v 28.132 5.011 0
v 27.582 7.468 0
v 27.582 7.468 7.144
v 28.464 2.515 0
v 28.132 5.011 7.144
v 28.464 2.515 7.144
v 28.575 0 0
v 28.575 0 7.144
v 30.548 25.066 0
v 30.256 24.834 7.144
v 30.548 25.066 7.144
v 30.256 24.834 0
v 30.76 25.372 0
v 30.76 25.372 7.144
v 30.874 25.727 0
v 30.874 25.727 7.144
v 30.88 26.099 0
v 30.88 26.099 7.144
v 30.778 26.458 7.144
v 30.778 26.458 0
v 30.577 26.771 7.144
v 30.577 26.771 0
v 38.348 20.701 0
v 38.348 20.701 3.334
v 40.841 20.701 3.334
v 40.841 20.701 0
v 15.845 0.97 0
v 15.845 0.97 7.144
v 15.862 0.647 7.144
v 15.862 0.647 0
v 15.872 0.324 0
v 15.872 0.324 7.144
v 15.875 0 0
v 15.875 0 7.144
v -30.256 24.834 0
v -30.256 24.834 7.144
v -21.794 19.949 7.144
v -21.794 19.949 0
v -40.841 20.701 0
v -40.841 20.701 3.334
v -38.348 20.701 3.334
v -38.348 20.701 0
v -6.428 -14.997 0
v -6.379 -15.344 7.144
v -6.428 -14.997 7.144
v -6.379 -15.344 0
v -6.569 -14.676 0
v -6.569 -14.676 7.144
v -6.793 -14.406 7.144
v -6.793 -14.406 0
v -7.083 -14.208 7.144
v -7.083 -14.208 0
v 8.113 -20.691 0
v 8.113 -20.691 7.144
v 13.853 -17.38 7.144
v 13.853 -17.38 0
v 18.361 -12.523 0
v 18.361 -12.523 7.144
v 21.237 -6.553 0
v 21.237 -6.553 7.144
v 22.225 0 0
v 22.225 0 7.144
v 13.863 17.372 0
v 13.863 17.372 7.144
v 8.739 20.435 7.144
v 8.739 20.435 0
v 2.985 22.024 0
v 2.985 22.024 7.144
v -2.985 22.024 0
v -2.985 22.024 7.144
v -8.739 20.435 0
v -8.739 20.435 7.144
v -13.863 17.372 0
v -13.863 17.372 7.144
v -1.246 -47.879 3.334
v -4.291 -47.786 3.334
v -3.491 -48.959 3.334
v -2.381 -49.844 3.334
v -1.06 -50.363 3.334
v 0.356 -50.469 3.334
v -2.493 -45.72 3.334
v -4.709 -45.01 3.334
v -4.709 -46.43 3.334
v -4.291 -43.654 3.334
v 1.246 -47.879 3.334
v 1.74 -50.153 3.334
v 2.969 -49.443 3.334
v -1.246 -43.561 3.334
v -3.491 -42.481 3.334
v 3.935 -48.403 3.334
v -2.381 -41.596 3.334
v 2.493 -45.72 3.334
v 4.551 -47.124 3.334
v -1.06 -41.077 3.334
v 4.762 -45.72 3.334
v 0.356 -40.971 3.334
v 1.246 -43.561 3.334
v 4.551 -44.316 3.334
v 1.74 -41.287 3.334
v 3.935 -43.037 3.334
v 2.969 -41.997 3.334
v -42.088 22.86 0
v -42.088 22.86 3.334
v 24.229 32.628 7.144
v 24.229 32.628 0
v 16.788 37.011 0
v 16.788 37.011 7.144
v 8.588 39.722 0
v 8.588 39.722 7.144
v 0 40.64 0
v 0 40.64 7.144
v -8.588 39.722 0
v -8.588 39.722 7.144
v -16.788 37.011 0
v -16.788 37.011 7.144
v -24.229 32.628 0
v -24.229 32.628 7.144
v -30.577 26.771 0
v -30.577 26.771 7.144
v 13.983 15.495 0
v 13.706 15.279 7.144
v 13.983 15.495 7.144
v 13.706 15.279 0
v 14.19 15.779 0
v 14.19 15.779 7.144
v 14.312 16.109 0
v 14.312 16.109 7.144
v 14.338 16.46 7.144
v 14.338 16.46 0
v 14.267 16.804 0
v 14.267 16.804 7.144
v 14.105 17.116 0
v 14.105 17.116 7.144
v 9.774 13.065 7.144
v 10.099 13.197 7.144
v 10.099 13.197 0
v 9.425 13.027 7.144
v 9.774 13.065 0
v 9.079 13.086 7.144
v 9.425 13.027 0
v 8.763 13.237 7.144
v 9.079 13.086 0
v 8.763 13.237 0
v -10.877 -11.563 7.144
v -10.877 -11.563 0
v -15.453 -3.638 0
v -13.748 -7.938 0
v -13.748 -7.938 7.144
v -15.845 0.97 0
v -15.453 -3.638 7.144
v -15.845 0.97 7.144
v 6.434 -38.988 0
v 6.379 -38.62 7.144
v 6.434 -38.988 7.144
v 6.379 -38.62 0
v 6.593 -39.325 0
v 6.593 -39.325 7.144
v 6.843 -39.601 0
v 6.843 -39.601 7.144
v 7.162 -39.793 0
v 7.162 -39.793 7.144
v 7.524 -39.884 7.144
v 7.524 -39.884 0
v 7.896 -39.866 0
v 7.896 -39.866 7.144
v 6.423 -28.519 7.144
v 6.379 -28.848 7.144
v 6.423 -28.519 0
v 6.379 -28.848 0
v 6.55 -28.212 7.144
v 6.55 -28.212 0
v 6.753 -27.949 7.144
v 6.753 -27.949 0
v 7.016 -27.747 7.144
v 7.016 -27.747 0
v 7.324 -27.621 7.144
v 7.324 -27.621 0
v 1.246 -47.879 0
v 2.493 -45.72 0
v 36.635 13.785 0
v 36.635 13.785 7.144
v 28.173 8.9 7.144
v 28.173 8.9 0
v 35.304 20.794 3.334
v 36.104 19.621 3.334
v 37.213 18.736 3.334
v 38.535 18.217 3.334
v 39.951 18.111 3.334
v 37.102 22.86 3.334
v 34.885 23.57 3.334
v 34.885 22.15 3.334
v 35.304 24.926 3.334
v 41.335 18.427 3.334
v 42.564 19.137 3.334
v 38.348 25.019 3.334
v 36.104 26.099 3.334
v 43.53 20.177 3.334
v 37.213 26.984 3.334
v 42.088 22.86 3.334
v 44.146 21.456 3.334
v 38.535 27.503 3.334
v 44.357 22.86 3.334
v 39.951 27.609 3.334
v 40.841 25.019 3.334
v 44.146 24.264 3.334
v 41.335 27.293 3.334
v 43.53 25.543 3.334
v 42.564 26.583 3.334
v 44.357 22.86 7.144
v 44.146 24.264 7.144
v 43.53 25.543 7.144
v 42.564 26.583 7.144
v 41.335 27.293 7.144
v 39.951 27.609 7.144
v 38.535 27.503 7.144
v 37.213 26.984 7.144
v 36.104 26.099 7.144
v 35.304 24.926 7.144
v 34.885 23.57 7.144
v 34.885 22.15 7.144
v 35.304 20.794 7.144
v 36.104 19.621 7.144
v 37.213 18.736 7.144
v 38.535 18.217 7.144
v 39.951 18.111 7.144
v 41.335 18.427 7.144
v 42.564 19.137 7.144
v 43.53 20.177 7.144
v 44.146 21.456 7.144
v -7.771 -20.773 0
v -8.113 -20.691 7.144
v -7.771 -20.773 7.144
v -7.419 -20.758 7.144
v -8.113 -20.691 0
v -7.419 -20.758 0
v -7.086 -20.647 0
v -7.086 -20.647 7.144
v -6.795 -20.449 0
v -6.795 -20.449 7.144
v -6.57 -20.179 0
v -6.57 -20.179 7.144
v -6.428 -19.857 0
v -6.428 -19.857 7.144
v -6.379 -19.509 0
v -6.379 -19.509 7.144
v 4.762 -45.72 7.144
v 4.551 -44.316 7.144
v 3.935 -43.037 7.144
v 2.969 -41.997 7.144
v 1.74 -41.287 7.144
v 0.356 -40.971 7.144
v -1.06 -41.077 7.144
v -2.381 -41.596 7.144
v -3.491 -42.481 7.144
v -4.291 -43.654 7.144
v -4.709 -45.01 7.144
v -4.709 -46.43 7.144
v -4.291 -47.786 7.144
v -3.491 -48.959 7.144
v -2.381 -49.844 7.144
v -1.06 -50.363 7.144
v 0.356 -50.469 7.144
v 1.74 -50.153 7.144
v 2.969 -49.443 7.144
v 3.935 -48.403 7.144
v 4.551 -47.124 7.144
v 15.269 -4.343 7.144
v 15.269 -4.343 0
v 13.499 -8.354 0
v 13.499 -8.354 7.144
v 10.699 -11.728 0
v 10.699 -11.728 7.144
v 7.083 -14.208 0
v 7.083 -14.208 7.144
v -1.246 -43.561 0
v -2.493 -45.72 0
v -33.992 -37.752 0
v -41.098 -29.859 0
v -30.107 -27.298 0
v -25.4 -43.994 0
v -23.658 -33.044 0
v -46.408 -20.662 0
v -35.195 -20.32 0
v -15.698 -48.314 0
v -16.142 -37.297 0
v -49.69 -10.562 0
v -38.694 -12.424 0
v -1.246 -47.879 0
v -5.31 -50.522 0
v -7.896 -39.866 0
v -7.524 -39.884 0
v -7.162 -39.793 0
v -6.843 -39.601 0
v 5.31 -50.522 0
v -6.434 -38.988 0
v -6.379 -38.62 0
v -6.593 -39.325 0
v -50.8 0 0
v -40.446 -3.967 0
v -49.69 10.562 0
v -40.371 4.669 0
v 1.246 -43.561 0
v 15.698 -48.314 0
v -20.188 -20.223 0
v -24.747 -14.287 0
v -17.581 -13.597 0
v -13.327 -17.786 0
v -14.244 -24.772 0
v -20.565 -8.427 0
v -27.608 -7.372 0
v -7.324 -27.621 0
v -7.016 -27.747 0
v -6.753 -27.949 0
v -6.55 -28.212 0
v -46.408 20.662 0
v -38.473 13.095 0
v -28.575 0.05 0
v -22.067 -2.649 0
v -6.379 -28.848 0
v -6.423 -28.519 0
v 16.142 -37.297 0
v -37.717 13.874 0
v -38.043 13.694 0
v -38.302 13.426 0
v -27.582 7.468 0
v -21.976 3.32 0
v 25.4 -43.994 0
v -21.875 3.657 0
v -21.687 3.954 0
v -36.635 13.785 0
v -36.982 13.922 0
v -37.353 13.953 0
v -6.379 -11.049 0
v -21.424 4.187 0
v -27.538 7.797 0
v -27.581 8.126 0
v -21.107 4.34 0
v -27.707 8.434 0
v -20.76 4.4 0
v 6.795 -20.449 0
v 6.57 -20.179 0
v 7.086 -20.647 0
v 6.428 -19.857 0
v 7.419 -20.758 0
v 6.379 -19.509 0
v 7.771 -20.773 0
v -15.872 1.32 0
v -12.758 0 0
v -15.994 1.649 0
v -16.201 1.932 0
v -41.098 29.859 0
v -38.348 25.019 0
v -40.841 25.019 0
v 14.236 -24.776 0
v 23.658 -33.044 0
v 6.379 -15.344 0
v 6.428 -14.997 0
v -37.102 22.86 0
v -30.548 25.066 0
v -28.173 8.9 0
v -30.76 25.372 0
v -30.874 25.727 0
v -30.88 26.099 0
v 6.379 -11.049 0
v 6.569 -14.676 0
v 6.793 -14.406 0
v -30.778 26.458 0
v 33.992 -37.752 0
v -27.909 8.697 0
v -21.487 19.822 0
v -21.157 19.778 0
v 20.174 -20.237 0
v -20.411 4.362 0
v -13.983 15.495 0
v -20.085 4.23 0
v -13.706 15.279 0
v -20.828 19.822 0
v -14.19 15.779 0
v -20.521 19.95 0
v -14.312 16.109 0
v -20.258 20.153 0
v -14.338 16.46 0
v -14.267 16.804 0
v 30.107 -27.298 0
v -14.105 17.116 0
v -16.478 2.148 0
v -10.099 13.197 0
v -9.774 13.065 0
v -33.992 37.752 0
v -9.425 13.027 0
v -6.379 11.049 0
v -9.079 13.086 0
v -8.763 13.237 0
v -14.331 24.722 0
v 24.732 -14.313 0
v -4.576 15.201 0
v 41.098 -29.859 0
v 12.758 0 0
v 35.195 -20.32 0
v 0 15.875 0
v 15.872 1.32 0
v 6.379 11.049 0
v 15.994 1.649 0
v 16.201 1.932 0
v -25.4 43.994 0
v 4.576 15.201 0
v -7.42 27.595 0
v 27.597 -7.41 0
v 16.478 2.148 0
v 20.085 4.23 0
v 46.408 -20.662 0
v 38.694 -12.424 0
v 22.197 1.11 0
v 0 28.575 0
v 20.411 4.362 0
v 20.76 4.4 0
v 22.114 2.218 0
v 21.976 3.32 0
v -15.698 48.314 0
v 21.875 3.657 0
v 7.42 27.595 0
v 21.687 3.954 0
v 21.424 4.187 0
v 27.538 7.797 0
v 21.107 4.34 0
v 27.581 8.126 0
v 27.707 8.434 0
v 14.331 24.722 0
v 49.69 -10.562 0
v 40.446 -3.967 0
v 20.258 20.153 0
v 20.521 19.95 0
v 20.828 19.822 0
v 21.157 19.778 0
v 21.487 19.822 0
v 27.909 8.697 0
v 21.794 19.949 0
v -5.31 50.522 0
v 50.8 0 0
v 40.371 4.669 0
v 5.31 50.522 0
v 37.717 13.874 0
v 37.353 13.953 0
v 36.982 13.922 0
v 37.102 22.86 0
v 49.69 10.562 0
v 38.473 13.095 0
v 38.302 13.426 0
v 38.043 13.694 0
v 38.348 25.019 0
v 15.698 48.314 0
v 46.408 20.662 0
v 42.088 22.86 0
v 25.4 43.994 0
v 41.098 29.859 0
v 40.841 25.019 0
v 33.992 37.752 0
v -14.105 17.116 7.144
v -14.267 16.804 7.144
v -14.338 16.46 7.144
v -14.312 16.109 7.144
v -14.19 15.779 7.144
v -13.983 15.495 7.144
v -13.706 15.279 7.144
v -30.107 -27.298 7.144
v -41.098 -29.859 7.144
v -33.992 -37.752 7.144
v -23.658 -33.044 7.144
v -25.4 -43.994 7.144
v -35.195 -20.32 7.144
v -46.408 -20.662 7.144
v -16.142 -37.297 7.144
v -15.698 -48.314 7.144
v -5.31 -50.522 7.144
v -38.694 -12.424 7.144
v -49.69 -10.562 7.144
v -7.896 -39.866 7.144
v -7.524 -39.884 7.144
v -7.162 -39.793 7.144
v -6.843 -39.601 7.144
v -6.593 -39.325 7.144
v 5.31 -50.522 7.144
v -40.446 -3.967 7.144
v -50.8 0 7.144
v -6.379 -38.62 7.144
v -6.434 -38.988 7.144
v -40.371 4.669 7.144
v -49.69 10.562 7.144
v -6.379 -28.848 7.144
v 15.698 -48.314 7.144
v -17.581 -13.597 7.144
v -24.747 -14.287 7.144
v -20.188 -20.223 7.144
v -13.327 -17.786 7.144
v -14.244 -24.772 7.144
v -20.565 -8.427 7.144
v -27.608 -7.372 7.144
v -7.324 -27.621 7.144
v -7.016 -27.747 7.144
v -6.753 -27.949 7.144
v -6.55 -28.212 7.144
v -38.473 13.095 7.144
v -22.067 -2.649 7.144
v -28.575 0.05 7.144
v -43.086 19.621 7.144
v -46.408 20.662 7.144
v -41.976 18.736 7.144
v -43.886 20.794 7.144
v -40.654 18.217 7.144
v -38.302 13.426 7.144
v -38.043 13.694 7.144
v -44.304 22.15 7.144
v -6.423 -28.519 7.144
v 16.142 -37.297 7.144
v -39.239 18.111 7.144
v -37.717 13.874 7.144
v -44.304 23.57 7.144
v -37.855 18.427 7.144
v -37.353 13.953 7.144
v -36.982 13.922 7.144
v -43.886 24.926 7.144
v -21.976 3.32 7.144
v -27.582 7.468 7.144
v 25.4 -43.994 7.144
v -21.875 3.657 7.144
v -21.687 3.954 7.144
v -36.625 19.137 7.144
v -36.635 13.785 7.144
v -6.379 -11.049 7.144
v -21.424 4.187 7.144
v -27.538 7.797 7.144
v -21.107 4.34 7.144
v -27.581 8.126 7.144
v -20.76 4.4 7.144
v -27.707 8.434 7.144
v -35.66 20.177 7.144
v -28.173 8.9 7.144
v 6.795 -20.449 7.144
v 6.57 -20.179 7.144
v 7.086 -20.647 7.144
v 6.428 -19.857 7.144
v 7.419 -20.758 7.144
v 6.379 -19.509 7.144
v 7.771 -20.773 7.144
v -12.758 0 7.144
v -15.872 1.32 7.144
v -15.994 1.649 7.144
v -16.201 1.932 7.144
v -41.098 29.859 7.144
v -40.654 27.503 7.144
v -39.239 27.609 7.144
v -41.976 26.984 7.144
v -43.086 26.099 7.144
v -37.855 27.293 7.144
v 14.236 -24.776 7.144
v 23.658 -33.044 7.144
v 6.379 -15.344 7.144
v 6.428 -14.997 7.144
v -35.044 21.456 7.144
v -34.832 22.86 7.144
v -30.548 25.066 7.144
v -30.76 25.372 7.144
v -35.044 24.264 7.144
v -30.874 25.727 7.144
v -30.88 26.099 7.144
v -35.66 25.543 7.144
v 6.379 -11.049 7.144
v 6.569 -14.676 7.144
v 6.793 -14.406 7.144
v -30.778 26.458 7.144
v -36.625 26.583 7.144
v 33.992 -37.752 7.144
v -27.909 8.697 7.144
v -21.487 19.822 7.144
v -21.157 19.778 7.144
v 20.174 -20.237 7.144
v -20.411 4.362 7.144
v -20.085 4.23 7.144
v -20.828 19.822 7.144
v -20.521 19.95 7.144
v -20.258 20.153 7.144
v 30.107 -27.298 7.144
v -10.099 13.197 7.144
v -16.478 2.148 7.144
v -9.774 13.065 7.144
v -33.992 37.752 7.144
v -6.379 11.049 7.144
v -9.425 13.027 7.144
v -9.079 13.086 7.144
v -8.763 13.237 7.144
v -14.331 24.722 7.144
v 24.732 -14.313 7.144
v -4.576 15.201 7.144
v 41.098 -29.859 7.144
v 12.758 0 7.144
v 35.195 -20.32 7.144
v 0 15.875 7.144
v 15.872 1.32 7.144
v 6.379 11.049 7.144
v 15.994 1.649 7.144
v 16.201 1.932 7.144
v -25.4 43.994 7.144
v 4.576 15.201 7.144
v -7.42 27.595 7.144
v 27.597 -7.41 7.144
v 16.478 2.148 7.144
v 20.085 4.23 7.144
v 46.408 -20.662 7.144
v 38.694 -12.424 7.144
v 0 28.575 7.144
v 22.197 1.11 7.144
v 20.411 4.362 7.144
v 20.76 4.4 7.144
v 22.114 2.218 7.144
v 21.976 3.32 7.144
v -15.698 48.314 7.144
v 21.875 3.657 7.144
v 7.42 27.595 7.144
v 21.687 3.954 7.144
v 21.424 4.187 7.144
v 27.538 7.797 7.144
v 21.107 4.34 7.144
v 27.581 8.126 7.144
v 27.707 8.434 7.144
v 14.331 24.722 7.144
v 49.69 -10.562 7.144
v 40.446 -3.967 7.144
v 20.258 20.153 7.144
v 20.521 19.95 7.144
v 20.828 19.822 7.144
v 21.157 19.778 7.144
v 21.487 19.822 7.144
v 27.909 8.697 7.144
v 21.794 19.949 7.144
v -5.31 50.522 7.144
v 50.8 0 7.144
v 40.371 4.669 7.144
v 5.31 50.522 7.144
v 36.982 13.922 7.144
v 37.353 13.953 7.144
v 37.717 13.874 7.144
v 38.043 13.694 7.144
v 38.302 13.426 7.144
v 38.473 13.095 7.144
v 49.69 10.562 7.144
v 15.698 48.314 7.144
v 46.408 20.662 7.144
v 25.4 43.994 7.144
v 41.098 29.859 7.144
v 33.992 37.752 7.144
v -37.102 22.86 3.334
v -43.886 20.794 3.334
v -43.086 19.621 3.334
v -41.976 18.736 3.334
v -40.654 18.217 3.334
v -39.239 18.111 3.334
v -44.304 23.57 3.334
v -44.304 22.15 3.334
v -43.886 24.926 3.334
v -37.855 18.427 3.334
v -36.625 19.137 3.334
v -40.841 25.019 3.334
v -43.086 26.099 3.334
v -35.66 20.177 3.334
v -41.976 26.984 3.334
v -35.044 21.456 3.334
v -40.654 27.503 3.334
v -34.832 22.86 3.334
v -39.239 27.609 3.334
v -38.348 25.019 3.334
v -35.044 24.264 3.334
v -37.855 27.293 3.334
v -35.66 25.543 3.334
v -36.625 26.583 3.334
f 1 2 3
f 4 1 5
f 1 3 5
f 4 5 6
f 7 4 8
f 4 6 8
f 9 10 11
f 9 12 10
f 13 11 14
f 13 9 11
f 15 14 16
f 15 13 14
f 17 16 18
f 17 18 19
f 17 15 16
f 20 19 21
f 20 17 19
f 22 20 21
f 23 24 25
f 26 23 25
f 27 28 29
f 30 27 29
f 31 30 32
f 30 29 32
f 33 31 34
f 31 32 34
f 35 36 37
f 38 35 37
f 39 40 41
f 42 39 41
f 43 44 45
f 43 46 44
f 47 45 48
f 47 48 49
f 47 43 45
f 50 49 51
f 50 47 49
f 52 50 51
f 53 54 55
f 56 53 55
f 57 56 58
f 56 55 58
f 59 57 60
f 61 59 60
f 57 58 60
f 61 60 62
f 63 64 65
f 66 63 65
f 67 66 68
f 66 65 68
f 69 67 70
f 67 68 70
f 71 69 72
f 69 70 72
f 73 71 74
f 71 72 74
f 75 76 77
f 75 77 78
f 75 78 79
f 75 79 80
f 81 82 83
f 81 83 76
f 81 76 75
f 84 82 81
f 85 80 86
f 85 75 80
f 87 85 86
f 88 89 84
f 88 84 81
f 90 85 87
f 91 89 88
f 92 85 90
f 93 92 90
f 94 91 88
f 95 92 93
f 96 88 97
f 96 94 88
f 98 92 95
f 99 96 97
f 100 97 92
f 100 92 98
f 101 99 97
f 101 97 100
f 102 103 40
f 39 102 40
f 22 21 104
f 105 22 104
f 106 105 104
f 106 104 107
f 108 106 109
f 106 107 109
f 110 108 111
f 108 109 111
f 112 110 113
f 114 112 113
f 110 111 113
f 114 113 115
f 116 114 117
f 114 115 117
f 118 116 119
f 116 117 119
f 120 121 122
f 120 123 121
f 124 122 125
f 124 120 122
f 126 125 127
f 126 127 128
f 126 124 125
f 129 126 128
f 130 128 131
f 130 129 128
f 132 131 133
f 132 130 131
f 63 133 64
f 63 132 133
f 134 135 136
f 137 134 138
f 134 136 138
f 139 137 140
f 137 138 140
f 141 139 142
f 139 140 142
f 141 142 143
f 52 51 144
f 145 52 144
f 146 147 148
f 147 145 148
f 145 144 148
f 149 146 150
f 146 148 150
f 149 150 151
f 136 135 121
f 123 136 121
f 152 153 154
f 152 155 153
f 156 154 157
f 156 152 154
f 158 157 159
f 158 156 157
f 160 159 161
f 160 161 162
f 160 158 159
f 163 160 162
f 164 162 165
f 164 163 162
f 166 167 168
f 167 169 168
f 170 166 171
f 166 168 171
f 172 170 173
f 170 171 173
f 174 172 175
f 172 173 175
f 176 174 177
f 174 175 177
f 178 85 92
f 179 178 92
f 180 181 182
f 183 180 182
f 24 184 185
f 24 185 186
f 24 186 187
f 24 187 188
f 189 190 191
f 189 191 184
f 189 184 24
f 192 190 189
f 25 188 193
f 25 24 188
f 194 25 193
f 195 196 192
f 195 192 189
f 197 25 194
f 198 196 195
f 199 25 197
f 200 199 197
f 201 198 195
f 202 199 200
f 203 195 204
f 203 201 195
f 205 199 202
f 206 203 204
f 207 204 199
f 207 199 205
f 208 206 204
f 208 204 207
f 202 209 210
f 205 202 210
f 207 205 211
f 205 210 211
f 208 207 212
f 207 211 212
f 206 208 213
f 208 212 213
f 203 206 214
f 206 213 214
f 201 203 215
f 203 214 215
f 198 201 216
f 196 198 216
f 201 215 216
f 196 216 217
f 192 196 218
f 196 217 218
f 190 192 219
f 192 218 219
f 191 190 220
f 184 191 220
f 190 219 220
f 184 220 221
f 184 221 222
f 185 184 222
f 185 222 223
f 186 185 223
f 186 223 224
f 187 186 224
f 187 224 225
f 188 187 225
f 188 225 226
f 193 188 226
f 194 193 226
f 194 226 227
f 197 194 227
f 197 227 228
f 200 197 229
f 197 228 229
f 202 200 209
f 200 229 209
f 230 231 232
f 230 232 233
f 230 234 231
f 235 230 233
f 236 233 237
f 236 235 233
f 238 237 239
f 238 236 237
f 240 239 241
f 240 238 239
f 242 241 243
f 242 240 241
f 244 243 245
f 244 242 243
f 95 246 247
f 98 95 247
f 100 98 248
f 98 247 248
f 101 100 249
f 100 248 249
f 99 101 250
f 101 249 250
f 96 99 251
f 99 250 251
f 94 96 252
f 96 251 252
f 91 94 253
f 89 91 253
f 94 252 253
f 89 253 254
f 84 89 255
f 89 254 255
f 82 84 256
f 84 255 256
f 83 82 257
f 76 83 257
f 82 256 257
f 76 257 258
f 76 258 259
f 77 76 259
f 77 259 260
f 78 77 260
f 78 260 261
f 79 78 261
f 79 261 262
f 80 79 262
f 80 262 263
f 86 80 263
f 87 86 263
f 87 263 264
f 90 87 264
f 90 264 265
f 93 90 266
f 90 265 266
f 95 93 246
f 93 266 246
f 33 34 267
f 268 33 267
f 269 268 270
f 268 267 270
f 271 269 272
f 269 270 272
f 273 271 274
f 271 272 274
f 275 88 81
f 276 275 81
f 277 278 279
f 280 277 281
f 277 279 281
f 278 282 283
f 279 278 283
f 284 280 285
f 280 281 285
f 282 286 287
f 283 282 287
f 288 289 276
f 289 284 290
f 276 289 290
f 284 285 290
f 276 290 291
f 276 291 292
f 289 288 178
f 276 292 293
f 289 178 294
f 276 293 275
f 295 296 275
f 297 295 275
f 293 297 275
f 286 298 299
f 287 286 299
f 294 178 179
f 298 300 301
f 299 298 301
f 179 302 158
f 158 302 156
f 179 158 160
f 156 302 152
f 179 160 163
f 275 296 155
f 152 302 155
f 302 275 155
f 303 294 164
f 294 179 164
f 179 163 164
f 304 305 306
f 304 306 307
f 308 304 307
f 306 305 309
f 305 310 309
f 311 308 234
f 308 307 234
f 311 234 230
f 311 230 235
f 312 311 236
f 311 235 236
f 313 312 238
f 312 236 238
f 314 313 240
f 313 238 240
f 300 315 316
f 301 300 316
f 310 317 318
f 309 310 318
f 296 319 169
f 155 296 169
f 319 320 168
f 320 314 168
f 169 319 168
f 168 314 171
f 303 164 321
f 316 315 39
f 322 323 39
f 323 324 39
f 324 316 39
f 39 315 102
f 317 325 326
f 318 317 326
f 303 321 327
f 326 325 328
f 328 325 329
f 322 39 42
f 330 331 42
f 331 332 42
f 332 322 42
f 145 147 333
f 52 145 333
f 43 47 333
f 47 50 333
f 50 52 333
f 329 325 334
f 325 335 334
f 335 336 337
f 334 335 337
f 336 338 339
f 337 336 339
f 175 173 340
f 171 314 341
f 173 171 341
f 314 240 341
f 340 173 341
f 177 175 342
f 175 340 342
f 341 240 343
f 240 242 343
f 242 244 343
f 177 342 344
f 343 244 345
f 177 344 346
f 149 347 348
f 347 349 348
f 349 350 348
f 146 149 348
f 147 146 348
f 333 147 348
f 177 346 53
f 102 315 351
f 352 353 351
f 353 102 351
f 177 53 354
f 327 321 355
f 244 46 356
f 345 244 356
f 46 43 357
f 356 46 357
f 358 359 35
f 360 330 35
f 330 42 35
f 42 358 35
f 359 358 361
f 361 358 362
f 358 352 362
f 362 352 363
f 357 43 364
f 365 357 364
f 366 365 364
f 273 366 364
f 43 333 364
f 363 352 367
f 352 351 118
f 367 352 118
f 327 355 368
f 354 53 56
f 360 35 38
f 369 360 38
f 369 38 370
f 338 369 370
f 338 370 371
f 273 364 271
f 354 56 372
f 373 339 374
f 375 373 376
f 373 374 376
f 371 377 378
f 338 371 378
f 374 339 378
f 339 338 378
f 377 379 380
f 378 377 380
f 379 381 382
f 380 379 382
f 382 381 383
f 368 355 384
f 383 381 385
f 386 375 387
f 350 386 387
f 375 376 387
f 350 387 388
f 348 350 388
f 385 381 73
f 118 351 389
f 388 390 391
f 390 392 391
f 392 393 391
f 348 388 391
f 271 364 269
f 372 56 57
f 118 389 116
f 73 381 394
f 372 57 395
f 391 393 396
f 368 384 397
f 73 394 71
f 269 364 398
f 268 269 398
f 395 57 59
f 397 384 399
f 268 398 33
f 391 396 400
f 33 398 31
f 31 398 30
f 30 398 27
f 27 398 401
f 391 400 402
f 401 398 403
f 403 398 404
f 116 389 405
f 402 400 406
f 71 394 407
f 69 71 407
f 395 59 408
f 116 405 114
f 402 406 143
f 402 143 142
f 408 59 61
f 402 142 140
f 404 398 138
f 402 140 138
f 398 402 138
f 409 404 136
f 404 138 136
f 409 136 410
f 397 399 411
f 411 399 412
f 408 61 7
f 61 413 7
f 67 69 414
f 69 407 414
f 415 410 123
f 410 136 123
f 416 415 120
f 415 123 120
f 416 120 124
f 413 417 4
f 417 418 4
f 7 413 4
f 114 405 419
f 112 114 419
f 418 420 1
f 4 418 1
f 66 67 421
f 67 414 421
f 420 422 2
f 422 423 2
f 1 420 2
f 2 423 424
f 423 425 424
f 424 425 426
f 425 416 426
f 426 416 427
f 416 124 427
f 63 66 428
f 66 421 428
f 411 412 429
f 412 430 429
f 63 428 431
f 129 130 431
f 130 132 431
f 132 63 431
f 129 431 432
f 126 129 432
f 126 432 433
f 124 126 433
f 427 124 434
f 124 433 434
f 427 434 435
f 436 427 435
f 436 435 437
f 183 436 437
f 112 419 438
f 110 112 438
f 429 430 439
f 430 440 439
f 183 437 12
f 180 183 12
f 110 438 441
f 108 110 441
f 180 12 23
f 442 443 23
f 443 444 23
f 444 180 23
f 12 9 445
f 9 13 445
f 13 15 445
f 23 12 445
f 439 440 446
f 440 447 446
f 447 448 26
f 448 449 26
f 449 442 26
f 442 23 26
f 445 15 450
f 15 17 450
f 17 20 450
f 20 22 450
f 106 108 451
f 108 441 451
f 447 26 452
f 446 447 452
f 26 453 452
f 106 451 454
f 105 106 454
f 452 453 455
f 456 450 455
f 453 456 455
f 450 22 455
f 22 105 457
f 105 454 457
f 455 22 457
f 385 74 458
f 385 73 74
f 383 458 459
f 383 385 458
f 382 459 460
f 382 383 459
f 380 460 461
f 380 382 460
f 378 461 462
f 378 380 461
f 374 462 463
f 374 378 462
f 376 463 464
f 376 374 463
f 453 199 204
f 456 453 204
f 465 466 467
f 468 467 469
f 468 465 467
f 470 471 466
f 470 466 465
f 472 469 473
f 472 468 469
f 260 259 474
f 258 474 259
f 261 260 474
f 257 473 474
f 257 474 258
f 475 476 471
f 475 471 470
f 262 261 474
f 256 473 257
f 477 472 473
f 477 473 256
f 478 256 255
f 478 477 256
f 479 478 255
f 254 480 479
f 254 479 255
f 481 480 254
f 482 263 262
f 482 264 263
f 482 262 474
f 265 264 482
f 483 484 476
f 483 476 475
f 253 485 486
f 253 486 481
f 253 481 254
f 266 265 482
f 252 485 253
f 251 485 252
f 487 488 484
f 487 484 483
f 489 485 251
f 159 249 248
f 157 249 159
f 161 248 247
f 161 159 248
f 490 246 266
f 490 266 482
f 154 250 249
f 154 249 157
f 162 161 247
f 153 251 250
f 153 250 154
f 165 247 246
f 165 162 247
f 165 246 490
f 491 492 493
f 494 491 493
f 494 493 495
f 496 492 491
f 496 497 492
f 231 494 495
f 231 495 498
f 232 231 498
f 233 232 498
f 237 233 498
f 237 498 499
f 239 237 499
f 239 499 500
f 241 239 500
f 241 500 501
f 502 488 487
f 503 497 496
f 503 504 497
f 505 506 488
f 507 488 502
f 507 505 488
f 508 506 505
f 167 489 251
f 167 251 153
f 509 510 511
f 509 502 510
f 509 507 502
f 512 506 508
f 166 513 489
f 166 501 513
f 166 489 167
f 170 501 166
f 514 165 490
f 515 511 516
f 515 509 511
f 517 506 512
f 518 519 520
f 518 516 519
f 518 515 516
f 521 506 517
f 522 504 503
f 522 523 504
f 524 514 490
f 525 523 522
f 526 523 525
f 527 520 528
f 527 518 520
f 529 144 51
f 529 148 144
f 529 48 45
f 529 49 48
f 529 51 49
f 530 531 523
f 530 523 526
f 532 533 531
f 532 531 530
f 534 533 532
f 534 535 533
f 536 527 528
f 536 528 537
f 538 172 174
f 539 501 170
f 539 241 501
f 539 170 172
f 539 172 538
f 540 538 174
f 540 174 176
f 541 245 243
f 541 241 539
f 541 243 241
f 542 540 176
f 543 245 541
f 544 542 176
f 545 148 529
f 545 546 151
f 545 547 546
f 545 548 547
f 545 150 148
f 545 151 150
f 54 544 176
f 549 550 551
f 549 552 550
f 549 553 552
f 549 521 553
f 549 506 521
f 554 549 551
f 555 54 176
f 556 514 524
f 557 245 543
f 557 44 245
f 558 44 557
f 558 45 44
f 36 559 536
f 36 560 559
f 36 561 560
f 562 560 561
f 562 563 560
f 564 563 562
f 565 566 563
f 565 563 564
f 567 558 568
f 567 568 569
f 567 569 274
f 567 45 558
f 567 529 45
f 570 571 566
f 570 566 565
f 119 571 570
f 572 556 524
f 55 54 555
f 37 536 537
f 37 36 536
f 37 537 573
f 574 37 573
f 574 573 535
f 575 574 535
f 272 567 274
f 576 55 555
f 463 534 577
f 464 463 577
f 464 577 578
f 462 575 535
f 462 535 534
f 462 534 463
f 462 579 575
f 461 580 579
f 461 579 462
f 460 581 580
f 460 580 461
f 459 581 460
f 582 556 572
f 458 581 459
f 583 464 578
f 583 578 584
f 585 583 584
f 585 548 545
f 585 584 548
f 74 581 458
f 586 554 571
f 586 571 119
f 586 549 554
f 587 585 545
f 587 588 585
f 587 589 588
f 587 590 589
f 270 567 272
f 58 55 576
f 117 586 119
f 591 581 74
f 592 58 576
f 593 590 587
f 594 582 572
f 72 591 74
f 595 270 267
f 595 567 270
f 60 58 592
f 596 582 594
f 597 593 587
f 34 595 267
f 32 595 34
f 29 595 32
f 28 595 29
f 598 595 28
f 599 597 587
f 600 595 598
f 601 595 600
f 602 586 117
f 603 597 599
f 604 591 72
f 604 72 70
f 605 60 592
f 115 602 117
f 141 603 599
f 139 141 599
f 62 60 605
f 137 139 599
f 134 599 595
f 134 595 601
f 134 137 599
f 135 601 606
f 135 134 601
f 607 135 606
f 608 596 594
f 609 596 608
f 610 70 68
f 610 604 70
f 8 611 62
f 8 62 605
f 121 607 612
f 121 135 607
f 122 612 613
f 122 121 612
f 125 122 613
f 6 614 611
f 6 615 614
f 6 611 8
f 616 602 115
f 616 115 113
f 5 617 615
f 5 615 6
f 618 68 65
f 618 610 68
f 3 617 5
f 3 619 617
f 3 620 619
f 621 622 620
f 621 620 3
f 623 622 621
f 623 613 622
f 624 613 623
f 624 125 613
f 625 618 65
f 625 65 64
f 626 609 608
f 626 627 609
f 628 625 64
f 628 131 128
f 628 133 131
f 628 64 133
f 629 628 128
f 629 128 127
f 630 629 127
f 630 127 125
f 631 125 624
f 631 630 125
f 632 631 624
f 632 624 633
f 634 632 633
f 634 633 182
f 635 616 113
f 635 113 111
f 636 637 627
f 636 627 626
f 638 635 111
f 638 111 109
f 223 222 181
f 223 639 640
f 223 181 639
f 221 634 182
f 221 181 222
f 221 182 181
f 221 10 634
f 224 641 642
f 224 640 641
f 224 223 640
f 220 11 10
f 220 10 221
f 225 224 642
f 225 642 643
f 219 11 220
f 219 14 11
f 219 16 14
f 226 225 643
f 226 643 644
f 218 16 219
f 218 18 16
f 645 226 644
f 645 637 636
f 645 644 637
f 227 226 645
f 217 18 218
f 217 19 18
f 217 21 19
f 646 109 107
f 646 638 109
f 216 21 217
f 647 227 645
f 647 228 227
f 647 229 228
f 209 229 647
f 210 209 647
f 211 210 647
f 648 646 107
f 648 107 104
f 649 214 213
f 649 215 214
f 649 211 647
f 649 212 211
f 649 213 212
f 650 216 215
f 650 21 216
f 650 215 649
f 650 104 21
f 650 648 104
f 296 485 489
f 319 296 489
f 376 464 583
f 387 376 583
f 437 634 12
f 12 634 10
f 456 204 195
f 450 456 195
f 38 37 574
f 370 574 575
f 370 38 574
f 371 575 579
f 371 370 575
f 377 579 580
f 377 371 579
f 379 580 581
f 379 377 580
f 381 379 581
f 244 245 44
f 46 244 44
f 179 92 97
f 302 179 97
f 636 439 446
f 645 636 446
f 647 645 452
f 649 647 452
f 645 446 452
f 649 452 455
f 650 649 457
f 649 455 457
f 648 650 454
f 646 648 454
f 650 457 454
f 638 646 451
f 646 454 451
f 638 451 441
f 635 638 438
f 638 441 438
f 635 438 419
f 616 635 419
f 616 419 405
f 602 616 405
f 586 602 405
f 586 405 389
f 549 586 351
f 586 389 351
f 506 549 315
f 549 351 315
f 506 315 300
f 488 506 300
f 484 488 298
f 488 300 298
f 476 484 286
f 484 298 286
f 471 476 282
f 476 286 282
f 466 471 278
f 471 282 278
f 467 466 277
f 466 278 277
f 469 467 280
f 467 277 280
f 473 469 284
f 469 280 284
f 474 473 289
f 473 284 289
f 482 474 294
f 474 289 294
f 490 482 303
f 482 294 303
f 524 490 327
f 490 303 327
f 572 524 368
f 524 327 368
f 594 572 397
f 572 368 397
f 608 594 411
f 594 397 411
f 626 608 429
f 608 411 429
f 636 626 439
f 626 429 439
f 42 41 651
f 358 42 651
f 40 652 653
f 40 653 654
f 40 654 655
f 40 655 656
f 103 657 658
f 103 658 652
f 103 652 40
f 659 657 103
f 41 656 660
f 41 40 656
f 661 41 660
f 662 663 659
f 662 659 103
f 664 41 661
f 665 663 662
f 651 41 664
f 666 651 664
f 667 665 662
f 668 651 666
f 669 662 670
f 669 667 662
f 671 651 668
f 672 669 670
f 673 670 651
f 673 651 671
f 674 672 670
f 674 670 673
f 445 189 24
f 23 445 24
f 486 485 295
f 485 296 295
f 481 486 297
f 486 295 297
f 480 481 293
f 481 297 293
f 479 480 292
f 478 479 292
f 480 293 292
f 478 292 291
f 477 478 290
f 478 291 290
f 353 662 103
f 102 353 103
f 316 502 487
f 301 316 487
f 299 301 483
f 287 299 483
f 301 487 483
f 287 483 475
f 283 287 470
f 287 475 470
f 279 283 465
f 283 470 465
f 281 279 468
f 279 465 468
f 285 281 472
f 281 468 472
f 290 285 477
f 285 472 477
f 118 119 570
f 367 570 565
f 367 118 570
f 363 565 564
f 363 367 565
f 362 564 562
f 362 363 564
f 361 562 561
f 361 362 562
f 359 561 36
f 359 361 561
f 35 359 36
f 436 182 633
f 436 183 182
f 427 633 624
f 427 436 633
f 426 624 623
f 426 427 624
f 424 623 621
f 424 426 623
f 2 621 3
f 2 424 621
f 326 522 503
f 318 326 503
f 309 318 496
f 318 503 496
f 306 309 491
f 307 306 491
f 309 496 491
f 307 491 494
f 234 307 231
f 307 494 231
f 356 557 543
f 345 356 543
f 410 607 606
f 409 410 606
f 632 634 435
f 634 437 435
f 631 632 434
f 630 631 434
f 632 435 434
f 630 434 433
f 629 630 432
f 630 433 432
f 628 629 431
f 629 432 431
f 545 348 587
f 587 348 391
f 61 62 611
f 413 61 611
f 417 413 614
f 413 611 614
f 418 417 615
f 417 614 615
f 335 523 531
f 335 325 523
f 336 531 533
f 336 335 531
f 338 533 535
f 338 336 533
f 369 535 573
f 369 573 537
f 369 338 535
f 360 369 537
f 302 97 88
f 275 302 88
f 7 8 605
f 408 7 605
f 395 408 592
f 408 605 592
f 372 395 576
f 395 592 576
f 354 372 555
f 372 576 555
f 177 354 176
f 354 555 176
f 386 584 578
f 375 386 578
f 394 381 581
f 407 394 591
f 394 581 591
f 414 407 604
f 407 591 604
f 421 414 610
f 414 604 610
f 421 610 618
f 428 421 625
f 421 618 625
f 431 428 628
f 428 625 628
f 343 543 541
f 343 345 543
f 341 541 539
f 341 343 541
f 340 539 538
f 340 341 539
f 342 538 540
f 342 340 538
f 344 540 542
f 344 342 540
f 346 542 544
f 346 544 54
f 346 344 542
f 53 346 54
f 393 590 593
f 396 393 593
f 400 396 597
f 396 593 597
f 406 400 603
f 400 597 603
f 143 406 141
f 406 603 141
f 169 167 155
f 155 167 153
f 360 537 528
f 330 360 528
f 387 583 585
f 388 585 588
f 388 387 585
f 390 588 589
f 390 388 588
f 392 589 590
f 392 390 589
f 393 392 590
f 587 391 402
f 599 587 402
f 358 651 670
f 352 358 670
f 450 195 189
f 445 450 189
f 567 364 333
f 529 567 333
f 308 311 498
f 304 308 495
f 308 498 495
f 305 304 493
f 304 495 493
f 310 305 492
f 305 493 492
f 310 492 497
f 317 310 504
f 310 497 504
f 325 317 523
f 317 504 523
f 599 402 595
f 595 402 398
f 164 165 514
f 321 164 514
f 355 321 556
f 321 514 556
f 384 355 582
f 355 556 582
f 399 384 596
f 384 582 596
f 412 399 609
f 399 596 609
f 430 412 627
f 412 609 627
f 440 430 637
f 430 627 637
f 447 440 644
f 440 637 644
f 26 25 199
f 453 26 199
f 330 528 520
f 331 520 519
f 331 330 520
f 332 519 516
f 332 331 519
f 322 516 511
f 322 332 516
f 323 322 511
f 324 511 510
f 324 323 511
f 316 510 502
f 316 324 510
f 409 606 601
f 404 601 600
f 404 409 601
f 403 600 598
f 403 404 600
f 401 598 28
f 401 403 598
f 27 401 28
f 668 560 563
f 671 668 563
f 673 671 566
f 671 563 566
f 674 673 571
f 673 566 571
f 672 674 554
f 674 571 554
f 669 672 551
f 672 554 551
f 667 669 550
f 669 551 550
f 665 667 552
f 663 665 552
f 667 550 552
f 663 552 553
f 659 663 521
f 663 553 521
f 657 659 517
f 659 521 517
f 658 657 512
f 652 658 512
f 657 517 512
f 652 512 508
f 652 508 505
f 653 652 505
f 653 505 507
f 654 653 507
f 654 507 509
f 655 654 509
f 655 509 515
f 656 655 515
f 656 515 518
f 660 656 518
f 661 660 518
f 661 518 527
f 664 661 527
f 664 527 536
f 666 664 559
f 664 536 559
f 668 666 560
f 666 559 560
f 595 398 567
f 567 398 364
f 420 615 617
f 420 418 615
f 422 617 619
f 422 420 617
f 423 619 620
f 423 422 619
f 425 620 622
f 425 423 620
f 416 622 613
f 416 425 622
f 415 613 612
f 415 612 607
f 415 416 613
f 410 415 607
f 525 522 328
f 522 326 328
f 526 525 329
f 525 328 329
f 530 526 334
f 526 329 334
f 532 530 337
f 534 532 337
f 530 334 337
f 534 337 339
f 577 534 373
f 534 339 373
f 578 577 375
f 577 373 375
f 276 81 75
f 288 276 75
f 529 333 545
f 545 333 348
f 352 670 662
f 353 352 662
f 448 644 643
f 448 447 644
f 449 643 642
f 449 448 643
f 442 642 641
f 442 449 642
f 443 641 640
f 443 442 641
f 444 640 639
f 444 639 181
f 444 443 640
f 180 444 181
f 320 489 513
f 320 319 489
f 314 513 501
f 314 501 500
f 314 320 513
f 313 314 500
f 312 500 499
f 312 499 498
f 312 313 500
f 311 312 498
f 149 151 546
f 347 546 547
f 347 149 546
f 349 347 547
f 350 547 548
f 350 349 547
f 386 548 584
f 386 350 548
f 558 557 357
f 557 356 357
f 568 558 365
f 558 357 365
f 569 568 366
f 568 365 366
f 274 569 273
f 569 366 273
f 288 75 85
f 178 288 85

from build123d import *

# Parameters (mm, degrees)
F0_R     = 50.8
F1_DEPTH = 7.14375
F3_DEPTH = 7.14475
F4_R     = 1.27
F5_R     = 4.7625
F6_DEPTH = 3.81


with BuildPart() as f1:
    # F0 (on Top) → F1 (new body)
    with BuildSketch(Plane.XY):
        Circle(F0_R)
        Polygon((-12.7582862486, 0), (-6.3791431243, 11.049), (6.3791431243, 11.049), (12.7582862486, 0), (6.3791431243, -11.049), (-6.3791431243, -11.049), align=None, mode=Mode.SUBTRACT)
    extrude(amount=F1_DEPTH)

    # F2 (on face) → F3 (cut, through all)
    with BuildSketch(Plane.XY.offset(7.14375)):
        with BuildLine():
            Line((-6.3791431243, -40.1362197149), (-6.3791431243, -27.8538535575))
            ThreePointArc((-6.3791431243, -27.8538535575), (-24.7466759131, -14.2875), (-27.3117163362, 8.4024267787))
            Line((-27.3117163362, 8.4024267787), (-37.9485574471, 14.5436098574))
            ThreePointArc((-37.9485574471, 14.5436098574), (-35.1952724098, -20.32), (-6.3791431243, -40.1362197149))
        make_face()
        Polygon((-38.3481822298, 25.019), (-40.8411806922, 25.019), (-42.0876799234, 22.86), (-40.8411806922, 20.701), (-38.3481822298, 20.701), (-37.1016829987, 22.86), align=None)
        Polygon((1.2464992312, -43.561), (-1.2464992312, -43.561), (-2.4929984624, -45.72), (-1.2464992312, -47.879), (1.2464992312, -47.879), (2.4929984624, -45.72), align=None)
        Polygon((40.8411806922, 25.019), (38.3481822298, 25.019), (37.1016829987, 22.86), (38.3481822298, 20.701), (40.8411806922, 20.701), (42.0876799234, 22.86), align=None)
        with BuildLine():
            ThreePointArc((-20.9325732119, 19.4514267787), (0, 28.575), (20.9325732119, 19.4514267787))
            Line((20.9325732119, 19.4514267787), (31.5694143228, 25.5926098574))
            ThreePointArc((31.5694143228, 25.5926098574), (0, 40.64), (-31.5694143228, 25.5926098574))
            Line((-31.5694143228, 25.5926098574), (-20.9325732119, 19.4514267787))
        make_face()
        with BuildLine():
            Line((6.3791431243, -27.8538535575), (6.3791431243, -40.1362197149))
            ThreePointArc((6.3791431243, -40.1362197149), (35.1952724098, -20.32), (37.9485574471, 14.5436098574))
            Line((37.9485574471, 14.5436098574), (27.3117163362, 8.4024267787))
            ThreePointArc((27.3117163362, 8.4024267787), (28.2574142422, 4.2484309276), (28.575, 0))
            ThreePointArc((28.575, 0), (22.3474231152, -17.8079562306), (6.3791431243, -27.8538535575))
        make_face()
        with BuildLine():
            Line((6.3791431243, -14.5369239525), (6.3791431243, -21.2898369651))
            ThreePointArc((6.3791431243, -21.2898369651), (17.8287279543, -13.2697808773), (22.225, 0))
            ThreePointArc((22.225, 0), (22.0750217642, 2.5776033652), (21.6271112163, 5.1204184825))
            Line((21.6271112163, 5.1204184825), (15.7789169979, 1.7439619762))
            ThreePointArc((15.7789169979, 1.7439619762), (15.8509610488, 0.8733034006), (15.875, 0))
            ThreePointArc((15.875, 0), (13.2906832424, -8.6817834545), (6.3791431243, -14.5369239525))
        make_face()
        with BuildLine():
            Line((9.3997738736, 12.7929619762), (15.2479680921, 16.1694184825))
            ThreePointArc((15.2479680921, 16.1694184825), (0, 22.225), (-15.2479680921, 16.1694184825))
            Line((-15.2479680921, 16.1694184825), (-9.3997738736, 12.7929619762))
            ThreePointArc((-9.3997738736, 12.7929619762), (0, 15.875), (9.3997738736, 12.7929619762))
        make_face()
        with BuildLine():
            ThreePointArc((-21.6271112163, 5.1204184825), (-19.2474145991, -11.1125), (-6.3791431243, -21.2898369651))
            Line((-6.3791431243, -21.2898369651), (-6.3791431243, -14.5369239525))
            ThreePointArc((-6.3791431243, -14.5369239525), (-13.7481532851, -7.9375), (-15.7789169979, 1.7439619762))
            Line((-15.7789169979, 1.7439619762), (-21.6271112163, 5.1204184825))
        make_face()
    extrude(amount=-F3_DEPTH, mode=Mode.SUBTRACT)

    # F4
    f4_edges = [f1.edges().sort_by_distance(p)[0] for p in [
        (-37.948557, 14.54361, 3.571875),
        (-27.311716, 8.402427, 3.571875),
        (-6.379143, -40.13622, 3.571875),
        (-6.379143, -27.853854, 3.571875),
        (-21.627111, 5.120418, 3.571875),
        (-15.778917, 1.743962, 3.571875),
        (-6.379143, -21.289837, 3.571875),
        (-6.379143, -14.536924, 3.571875),
        (6.379143, -21.289837, 3.571875),
        (6.379143, -14.536924, 3.571875),
        (21.627111, 5.120418, 3.571875),
        (15.778917, 1.743962, 3.571875),
        (6.379143, -40.13622, 3.571875),
        (6.379143, -27.853854, 3.571875),
        (37.948557, 14.54361, 3.571875),
        (27.311716, 8.402427, 3.571875),
        (31.569414, 25.59261, 3.571875),
        (20.932573, 19.451427, 3.571875),
        (-31.569414, 25.59261, 3.571875),
        (-20.932573, 19.451427, 3.571875),
        (15.247968, 16.169418, 3.571875),
        (9.399774, 12.792962, 3.571875),
        (-15.247968, 16.169418, 3.571875),
        (-9.399774, 12.792962, 3.571875),
    ]]
    fillet(f4_edges, radius=F4_R)

    # F5 (on face) → F6 (cut)
    with BuildSketch(Plane.XY.offset(7.14375)):
        with Locations((-39.594681461, 22.86)):
            Circle(F5_R)
        Polygon((-42.0876799234, 22.86), (-40.8411806922, 25.019), (-38.3481822298, 25.019), (-37.1016829987, 22.86), (-38.3481822298, 20.701), (-40.8411806922, 20.701), align=None, mode=Mode.SUBTRACT)
        with Locations((39.594681461, 22.86)):
            Circle(F5_R)
        Polygon((38.3481822298, 25.019), (40.8411806922, 25.019), (42.0876799234, 22.86), (40.8411806922, 20.701), (38.3481822298, 20.701), (37.1016829987, 22.86), align=None, mode=Mode.SUBTRACT)
        with Locations((0, -45.72)):
            Circle(F5_R)
        Polygon((-2.4929984624, -45.72), (-1.2464992312, -43.561), (1.2464992312, -43.561), (2.4929984624, -45.72), (1.2464992312, -47.879), (-1.2464992312, -47.879), align=None, mode=Mode.SUBTRACT)
    extrude(amount=-F6_DEPTH, mode=Mode.SUBTRACT)


solid = f1.part
